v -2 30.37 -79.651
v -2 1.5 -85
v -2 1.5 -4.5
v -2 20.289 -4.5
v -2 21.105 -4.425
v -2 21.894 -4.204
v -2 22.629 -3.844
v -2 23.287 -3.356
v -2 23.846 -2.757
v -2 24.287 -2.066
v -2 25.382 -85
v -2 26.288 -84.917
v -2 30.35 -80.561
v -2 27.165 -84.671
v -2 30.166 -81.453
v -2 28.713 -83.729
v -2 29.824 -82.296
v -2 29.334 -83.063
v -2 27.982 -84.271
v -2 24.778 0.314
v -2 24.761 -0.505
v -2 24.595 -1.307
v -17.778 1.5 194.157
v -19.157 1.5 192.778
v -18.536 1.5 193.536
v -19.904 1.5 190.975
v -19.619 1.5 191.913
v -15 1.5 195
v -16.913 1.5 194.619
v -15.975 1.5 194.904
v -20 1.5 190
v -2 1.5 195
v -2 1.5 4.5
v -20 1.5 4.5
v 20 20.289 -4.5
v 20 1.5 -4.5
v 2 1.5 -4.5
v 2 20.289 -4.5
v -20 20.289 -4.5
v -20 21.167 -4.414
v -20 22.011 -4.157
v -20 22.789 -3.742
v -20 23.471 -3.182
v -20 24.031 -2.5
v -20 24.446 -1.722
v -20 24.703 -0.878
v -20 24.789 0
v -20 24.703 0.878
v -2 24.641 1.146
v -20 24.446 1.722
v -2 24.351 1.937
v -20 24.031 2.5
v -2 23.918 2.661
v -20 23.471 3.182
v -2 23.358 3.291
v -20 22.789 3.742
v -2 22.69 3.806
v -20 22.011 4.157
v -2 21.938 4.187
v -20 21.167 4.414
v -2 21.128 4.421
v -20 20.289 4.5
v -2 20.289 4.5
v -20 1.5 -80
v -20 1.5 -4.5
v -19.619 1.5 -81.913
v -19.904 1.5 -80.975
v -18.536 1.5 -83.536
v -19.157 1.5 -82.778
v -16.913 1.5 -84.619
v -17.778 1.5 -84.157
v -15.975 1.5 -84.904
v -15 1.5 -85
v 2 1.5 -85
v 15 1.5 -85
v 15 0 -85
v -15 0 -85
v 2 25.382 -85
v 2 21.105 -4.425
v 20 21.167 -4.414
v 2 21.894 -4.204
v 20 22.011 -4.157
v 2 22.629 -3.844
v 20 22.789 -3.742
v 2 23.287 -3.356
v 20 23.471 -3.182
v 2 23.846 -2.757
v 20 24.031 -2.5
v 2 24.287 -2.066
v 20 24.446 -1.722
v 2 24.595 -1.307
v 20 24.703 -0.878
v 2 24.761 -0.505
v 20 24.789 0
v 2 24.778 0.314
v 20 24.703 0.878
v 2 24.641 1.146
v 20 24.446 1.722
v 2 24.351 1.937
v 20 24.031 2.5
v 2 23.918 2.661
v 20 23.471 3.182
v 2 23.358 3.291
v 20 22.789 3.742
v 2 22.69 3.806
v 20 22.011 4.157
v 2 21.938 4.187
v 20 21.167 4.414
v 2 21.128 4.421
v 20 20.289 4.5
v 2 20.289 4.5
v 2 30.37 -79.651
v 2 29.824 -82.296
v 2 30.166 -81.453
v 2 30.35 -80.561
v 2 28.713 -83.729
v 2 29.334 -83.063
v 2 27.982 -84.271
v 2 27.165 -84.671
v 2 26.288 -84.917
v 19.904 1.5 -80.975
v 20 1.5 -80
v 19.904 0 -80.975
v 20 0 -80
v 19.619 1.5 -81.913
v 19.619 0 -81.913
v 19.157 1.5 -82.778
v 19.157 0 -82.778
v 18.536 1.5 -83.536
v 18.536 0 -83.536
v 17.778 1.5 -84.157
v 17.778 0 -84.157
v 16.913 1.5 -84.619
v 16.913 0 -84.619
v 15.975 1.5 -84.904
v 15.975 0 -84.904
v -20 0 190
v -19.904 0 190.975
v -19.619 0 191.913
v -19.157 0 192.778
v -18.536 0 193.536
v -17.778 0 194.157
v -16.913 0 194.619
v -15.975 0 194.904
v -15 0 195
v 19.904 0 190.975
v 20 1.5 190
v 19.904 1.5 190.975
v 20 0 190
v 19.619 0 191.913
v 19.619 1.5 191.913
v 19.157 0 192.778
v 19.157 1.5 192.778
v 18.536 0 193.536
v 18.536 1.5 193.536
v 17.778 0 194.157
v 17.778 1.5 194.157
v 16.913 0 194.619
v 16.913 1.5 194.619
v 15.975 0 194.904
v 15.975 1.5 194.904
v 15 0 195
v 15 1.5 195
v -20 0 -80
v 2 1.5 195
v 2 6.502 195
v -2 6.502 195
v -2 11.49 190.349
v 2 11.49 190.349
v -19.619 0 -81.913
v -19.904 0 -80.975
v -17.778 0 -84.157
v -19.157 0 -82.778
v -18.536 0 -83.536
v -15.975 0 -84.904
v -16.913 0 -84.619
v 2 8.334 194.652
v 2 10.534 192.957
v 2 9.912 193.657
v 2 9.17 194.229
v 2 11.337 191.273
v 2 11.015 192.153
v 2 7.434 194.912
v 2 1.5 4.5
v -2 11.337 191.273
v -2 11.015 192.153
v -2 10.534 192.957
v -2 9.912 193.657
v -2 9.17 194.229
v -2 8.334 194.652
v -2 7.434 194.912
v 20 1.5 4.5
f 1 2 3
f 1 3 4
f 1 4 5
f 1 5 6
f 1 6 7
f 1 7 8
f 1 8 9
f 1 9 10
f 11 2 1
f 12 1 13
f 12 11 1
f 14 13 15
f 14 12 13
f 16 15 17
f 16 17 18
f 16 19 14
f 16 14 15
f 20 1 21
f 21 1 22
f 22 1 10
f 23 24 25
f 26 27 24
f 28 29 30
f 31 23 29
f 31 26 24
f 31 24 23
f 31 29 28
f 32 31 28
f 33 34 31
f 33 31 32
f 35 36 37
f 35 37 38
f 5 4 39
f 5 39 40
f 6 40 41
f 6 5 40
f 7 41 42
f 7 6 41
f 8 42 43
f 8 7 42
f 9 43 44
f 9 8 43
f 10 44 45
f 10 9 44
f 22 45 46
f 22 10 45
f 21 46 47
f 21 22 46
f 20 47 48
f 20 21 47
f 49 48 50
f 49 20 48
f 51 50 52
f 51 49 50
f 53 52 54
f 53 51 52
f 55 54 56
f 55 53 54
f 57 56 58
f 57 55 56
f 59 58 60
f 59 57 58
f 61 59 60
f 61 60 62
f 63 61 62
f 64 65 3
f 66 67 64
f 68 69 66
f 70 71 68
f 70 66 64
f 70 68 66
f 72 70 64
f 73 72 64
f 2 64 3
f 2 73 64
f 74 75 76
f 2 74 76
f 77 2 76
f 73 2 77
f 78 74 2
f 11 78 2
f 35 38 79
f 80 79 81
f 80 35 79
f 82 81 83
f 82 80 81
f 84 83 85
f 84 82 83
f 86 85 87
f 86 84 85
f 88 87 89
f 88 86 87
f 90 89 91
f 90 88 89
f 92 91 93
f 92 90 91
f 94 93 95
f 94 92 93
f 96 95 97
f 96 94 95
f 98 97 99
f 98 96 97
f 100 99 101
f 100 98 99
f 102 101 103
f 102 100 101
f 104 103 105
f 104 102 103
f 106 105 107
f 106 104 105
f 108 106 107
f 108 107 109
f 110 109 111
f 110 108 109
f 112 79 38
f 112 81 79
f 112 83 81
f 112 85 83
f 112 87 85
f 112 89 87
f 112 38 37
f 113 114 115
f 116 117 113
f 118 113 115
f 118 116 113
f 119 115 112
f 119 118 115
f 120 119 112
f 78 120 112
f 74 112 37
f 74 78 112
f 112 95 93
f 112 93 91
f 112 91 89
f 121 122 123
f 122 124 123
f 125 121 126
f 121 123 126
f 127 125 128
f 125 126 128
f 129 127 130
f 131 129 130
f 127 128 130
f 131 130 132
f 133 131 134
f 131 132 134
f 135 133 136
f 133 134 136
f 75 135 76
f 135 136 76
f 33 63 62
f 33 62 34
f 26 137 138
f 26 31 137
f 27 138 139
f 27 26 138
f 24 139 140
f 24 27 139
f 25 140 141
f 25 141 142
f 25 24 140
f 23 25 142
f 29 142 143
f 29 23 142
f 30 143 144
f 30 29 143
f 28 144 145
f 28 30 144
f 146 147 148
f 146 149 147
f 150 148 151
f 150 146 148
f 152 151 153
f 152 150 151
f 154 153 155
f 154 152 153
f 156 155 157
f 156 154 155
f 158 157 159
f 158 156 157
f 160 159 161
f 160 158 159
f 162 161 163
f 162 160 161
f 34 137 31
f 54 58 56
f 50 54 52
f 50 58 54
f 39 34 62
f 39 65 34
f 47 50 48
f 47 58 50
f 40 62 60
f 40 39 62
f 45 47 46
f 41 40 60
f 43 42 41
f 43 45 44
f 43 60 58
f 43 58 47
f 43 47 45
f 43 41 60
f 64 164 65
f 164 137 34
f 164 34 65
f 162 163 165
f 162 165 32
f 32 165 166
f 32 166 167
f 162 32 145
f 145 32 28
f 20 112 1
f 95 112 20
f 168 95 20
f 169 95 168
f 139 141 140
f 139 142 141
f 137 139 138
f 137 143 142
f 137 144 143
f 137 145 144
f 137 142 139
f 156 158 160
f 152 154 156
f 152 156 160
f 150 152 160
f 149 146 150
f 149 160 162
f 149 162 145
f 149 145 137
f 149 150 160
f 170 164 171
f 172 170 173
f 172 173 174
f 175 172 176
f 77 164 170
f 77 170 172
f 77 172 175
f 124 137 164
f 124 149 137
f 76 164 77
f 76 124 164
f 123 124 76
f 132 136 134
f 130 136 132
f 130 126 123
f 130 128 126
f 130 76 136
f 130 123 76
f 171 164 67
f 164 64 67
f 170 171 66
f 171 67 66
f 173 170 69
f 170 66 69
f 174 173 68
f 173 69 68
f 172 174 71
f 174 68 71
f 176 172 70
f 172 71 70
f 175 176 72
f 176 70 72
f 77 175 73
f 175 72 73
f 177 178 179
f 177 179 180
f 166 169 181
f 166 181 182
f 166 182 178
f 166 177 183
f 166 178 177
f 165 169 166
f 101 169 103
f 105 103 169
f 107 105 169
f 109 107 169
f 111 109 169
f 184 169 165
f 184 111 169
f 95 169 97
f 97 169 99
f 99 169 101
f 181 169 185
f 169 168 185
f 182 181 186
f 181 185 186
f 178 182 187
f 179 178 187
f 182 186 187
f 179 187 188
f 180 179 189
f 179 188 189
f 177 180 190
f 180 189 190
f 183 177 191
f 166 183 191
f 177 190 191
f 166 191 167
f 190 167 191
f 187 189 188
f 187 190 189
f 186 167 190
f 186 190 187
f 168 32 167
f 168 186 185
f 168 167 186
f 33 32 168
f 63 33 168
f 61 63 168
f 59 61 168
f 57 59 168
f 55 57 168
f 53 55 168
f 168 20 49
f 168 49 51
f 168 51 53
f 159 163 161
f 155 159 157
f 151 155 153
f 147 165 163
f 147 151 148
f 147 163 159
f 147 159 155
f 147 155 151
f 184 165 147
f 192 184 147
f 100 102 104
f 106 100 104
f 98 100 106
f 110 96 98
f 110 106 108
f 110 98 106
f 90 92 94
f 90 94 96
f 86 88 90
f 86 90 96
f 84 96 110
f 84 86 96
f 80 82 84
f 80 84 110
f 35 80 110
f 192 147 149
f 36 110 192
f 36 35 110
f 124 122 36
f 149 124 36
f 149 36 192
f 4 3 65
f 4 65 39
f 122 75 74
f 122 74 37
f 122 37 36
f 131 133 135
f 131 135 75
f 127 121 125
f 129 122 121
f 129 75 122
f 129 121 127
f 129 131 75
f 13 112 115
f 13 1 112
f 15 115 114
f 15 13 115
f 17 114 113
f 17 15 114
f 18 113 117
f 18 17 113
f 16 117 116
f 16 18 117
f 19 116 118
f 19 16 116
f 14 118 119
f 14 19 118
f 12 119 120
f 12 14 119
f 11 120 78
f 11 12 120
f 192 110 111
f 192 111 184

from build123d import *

# Parameters (mm, degrees)
BOSS_EXTRU_1_START      = -85
BOSS_EXTRU_1_DEPTH      = 280
ENL_V_MAT_EXTRU_1_DEPTH = 201.577291835
BOSS_EXTRU_2_REACH      = 203.42
CONG_1_R                = 5


with BuildPart() as part:
    # Esquisse1 → Boss.-Extru.1 (new body)
    with BuildSketch(Plane.XY.offset(BOSS_EXTRU_1_START)):
        Polygon((2, 1.5), (20, 1.5), (20, 0), (-20, 0), (-20, 1.5), (-2, 1.5), (-2, 41.5), (2, 41.5), align=None)
    extrude(amount=BOSS_EXTRU_1_DEPTH)

    # Esquisse3 → Enlèv. mat.-Extru.1 (cut, through all)
    with BuildSketch(Plane(origin=(2, 0, 0), x_dir=(0, 0, -1), z_dir=(1, 0, 0))):
        Polygon((-195, 41.5), (85, 41.5), (85, 30.743779015), (-195, 11.164271671), align=None)
    extrude(amount=-ENL_V_MAT_EXTRU_1_DEPTH, mode=Mode.SUBTRACT)

    # Boss.-Extru.2: up to this face of the body (flat: up to its plane)
    boss_extru_2_end = Plane(part.part.faces().sort_by_distance((-20, 0.75, 55))[0])
    # Esquisse2 → Boss.-Extru.2 (add, up to the picked face)
    with BuildSketch(Plane(origin=(20, 0, 0), x_dir=(0, 0, -1), z_dir=(1, 0, 0)), mode=Mode.PRIVATE) as boss_extru_2_sk1:
        with BuildLine():
            Line((-4.5, 0), (4.5, 0))
            Line((4.5, 0), (4.5, 20.289011459))
            ThreePointArc((4.5, 20.289011459), (0, 24.789011459), (-4.5, 20.289011459))
            Line((-4.5, 20.289011459), (-4.5, 0))
        make_face()
    boss_extru_2_tool1 = split(extrude(boss_extru_2_sk1.sketch, amount=-BOSS_EXTRU_2_REACH, mode=Mode.PRIVATE), bisect_by=boss_extru_2_end, keep=Keep.BOTH, mode=Mode.PRIVATE)
    add(boss_extru_2_tool1.solids().sort_by(Axis((20, 11.932824, 0), (-1, 0, 0)))[0])

    # Congé1
    cong_1_edges = [part.edges().sort_by_distance(p)[0] for p in [
        (-20, 0.75, 195),
        (20, 0.75, 195),
        (0, 30.743779015, -85),
        (0, 11.164271671, 195),
        (20, 0.75, -85),
        (-20, 0.75, -85),
    ]]
    fillet(cong_1_edges, radius=CONG_1_R)


solid = part.part
